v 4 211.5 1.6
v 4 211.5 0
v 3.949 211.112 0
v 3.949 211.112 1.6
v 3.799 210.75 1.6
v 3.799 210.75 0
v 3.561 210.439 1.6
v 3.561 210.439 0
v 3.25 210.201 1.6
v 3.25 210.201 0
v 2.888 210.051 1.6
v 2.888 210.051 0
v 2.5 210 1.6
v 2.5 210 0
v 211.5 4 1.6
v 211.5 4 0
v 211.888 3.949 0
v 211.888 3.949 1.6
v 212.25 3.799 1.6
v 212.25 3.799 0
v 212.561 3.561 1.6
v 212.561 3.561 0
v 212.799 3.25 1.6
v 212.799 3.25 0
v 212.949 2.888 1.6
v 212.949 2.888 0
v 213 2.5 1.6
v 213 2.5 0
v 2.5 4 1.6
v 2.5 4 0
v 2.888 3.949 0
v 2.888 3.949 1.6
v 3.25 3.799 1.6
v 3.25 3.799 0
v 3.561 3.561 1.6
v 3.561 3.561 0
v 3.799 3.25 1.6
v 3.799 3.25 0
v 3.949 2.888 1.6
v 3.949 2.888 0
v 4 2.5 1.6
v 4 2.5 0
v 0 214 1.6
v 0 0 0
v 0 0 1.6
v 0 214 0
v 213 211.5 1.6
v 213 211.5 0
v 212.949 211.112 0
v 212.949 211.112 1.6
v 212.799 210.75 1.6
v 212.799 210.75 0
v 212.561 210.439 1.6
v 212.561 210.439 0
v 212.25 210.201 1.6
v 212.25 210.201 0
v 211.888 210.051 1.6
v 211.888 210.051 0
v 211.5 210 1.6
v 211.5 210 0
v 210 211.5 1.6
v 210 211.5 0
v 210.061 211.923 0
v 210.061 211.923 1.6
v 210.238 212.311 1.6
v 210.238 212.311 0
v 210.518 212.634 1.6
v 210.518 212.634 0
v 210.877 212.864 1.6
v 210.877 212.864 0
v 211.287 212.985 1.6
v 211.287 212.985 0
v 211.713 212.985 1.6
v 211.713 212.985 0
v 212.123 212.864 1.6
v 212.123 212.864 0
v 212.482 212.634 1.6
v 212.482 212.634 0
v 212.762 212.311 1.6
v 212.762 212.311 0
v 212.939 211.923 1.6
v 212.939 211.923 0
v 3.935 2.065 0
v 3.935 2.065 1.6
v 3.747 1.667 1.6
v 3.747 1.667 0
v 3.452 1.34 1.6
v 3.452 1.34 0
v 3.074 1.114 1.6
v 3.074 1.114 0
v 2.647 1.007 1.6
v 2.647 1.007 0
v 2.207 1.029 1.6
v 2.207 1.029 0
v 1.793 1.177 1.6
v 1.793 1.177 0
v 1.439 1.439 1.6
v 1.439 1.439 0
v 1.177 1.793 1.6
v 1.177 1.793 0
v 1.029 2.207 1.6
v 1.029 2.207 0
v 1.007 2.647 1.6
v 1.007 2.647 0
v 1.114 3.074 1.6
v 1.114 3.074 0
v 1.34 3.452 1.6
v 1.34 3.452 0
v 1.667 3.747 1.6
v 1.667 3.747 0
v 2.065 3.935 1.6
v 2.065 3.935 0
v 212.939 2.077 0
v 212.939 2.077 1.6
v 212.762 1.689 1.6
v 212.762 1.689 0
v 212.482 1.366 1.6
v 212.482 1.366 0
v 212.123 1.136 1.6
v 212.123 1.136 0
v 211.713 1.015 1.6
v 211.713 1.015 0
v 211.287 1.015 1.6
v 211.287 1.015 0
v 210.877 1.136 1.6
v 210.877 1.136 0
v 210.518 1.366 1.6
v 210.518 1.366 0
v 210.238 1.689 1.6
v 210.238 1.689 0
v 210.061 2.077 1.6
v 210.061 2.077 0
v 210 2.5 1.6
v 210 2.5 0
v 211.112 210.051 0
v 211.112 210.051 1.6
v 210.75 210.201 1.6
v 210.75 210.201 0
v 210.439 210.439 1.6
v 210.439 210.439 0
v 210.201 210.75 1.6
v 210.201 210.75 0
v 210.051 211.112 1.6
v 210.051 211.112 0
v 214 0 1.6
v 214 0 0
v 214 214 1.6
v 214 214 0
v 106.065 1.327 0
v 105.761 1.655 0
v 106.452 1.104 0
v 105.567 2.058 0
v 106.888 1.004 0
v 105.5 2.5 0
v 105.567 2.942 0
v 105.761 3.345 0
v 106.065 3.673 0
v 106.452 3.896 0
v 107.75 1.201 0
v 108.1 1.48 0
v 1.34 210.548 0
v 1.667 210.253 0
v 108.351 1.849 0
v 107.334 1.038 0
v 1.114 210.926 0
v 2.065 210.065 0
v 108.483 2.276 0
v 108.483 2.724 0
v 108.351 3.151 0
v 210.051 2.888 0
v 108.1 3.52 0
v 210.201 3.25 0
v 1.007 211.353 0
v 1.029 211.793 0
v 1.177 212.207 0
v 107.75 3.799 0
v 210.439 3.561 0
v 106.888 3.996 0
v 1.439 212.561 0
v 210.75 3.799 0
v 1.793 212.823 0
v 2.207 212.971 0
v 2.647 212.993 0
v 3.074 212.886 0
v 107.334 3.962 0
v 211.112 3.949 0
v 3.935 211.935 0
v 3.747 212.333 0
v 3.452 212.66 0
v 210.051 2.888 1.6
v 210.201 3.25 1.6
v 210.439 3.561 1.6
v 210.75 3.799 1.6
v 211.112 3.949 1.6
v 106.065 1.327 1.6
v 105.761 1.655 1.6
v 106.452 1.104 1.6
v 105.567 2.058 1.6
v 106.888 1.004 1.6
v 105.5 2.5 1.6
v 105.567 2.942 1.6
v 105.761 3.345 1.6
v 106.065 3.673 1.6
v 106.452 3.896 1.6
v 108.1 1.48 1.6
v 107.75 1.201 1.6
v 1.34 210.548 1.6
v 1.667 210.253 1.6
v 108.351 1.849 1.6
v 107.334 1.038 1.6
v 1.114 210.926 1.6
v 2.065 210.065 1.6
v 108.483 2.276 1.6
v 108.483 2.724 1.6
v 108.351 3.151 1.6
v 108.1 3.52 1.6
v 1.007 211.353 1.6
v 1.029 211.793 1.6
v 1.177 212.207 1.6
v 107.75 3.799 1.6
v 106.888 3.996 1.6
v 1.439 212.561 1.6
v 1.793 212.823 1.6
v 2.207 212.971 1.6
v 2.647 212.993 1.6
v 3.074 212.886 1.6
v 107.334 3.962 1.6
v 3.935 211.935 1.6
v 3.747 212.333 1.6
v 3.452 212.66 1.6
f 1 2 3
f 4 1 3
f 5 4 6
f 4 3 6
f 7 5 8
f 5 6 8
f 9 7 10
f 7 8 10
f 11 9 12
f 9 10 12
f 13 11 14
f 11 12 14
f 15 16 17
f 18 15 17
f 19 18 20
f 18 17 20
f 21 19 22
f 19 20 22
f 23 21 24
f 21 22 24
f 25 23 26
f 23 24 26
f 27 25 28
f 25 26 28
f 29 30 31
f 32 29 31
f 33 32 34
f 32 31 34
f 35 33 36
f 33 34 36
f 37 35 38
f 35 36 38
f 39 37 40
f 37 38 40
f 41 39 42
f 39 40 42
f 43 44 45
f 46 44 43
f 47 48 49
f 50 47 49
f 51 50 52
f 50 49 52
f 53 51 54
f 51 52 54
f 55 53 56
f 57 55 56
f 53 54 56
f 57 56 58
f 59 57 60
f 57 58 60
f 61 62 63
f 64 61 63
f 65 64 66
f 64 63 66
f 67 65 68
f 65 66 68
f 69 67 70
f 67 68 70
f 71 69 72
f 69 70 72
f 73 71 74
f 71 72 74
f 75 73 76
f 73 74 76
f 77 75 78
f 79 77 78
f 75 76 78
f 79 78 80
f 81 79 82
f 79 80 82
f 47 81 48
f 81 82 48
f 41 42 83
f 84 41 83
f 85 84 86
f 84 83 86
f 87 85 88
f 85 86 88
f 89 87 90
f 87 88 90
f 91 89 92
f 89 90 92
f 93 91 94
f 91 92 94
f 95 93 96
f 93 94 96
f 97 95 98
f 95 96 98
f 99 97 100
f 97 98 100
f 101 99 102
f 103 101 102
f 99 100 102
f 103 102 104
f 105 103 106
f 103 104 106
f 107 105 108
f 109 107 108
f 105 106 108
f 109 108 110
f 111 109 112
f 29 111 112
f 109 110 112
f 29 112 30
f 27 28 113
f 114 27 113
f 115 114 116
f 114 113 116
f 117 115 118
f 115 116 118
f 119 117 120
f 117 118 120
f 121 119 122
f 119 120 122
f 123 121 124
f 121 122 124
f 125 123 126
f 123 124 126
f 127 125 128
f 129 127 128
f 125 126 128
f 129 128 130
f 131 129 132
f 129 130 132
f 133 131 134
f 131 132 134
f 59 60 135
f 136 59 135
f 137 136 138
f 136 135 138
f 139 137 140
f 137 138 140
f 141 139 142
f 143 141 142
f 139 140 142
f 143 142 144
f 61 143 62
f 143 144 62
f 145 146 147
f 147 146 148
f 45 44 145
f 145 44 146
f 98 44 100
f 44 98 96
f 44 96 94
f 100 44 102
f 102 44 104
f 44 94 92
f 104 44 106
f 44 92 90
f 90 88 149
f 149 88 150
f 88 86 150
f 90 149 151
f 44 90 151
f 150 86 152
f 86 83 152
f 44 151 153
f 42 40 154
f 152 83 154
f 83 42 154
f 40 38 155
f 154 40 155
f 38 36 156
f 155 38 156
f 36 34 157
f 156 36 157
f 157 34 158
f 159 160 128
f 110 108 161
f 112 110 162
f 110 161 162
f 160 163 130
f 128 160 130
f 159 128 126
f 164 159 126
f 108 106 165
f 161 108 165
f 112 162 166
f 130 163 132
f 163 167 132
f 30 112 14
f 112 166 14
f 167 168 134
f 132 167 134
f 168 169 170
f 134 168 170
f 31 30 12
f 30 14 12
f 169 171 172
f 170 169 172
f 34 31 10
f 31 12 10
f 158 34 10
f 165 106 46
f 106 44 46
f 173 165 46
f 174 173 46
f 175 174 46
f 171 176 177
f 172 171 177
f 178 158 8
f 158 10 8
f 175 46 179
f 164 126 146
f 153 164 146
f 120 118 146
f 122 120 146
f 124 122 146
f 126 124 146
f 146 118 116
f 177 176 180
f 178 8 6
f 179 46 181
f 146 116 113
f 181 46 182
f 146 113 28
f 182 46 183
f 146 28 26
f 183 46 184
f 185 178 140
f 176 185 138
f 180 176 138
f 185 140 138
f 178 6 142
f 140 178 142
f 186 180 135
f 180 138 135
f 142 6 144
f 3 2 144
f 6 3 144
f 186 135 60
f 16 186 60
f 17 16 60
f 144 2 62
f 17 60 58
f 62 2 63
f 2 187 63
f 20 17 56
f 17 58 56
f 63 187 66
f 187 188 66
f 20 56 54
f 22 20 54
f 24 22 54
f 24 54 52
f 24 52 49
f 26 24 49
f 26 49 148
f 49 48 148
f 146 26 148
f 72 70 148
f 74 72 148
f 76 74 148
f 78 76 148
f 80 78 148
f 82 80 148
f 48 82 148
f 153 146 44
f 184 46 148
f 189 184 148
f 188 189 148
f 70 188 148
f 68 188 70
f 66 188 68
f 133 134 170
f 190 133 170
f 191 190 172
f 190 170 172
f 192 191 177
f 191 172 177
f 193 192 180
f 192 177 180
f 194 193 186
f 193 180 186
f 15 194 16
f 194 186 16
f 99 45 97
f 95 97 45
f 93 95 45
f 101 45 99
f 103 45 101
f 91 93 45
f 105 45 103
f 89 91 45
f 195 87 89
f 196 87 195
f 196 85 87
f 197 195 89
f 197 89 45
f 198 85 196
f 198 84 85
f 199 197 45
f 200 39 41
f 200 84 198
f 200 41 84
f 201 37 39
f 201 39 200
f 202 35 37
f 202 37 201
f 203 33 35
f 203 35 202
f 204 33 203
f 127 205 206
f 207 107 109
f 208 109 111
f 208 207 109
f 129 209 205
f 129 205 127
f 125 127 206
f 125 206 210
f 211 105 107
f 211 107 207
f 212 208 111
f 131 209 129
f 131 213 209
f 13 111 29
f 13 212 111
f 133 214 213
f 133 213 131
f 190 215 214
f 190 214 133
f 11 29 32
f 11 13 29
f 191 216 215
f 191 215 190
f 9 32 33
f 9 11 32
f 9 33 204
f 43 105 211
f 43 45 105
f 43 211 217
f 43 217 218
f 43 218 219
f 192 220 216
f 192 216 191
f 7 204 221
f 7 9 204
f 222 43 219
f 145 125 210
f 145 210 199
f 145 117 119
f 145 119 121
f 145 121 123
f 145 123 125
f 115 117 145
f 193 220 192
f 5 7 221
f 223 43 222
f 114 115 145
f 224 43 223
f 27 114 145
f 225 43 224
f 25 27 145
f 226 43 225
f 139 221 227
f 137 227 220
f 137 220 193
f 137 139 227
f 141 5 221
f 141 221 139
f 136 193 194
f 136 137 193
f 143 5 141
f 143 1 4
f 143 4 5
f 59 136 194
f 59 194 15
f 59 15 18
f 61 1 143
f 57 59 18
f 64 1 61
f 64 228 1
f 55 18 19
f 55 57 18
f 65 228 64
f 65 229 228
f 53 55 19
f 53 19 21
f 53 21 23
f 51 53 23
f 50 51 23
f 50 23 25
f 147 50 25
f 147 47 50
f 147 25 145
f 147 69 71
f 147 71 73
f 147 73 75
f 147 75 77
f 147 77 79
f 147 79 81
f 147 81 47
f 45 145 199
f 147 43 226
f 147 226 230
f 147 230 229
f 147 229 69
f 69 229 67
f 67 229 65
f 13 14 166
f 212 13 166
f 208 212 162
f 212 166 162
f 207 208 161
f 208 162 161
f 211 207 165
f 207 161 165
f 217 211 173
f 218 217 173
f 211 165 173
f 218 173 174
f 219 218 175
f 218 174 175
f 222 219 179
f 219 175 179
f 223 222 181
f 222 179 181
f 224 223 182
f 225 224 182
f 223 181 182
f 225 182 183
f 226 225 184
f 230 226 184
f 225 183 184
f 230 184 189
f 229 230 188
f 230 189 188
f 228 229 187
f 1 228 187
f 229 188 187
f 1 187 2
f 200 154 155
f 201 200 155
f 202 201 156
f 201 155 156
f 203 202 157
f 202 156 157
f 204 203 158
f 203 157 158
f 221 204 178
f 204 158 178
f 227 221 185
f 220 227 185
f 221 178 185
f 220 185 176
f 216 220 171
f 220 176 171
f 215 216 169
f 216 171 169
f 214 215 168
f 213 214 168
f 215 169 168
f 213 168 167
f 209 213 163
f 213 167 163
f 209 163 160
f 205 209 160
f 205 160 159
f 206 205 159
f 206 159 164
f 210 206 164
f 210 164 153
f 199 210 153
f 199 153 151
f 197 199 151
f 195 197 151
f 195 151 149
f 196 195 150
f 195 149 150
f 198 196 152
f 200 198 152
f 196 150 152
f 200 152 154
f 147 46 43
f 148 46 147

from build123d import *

# Parameters (mm, degrees)
F0_W     = 214
F0_H     = 214
F1_DEPTH = 1.6


with BuildPart() as f1:
    # F0 (on Top) → F1 (new body)
    with BuildSketch(Plane.XY):
        with Locations((107, 107)):
            Rectangle(F0_W, F0_H)
        with BuildLine():
            Line((105.5, 2.5), (4, 2.5))
            ThreePointArc((4, 2.5), (1.4393398282, 1.4393398282), (2.5, 4))
            Line((2.5, 4), (2.5, 210))
            ThreePointArc((2.5, 210), (1.4393398282, 212.5606601718), (4, 211.5))
            Line((4, 211.5), (210, 211.5))
            ThreePointArc((210, 211.5), (211.5, 213), (213, 211.5))
            ThreePointArc((213, 211.5), (212.5606601718, 210.4393398282), (211.5, 210))
            Line((211.5, 210), (211.5, 4))
            ThreePointArc((211.5, 4), (212.5606601718, 3.5606601718), (213, 2.5))
            ThreePointArc((213, 2.5), (211.5, 1), (210, 2.5))
            Line((210, 2.5), (108.5, 2.5))
            ThreePointArc((108.5, 2.5), (107, 1), (105.5, 2.5))
        make_face(mode=Mode.SUBTRACT)
        with BuildLine():
            ThreePointArc((2.5, 4), (3.5606601718, 3.5606601718), (4, 2.5))
            Line((4, 2.5), (105.5, 2.5))
            ThreePointArc((105.5, 2.5), (107, 4), (108.5, 2.5))
            Line((108.5, 2.5), (210, 2.5))
            ThreePointArc((210, 2.5), (210.4393398282, 3.5606601718), (211.5, 4))
            Line((211.5, 4), (211.5, 210))
            ThreePointArc((211.5, 210), (210.4393398282, 210.4393398282), (210, 211.5))
            Line((210, 211.5), (4, 211.5))
            ThreePointArc((4, 211.5), (3.5606601718, 210.4393398282), (2.5, 210))
            Line((2.5, 210), (2.5, 4))
        make_face()
    extrude(amount=F1_DEPTH)


solid = f1.part
